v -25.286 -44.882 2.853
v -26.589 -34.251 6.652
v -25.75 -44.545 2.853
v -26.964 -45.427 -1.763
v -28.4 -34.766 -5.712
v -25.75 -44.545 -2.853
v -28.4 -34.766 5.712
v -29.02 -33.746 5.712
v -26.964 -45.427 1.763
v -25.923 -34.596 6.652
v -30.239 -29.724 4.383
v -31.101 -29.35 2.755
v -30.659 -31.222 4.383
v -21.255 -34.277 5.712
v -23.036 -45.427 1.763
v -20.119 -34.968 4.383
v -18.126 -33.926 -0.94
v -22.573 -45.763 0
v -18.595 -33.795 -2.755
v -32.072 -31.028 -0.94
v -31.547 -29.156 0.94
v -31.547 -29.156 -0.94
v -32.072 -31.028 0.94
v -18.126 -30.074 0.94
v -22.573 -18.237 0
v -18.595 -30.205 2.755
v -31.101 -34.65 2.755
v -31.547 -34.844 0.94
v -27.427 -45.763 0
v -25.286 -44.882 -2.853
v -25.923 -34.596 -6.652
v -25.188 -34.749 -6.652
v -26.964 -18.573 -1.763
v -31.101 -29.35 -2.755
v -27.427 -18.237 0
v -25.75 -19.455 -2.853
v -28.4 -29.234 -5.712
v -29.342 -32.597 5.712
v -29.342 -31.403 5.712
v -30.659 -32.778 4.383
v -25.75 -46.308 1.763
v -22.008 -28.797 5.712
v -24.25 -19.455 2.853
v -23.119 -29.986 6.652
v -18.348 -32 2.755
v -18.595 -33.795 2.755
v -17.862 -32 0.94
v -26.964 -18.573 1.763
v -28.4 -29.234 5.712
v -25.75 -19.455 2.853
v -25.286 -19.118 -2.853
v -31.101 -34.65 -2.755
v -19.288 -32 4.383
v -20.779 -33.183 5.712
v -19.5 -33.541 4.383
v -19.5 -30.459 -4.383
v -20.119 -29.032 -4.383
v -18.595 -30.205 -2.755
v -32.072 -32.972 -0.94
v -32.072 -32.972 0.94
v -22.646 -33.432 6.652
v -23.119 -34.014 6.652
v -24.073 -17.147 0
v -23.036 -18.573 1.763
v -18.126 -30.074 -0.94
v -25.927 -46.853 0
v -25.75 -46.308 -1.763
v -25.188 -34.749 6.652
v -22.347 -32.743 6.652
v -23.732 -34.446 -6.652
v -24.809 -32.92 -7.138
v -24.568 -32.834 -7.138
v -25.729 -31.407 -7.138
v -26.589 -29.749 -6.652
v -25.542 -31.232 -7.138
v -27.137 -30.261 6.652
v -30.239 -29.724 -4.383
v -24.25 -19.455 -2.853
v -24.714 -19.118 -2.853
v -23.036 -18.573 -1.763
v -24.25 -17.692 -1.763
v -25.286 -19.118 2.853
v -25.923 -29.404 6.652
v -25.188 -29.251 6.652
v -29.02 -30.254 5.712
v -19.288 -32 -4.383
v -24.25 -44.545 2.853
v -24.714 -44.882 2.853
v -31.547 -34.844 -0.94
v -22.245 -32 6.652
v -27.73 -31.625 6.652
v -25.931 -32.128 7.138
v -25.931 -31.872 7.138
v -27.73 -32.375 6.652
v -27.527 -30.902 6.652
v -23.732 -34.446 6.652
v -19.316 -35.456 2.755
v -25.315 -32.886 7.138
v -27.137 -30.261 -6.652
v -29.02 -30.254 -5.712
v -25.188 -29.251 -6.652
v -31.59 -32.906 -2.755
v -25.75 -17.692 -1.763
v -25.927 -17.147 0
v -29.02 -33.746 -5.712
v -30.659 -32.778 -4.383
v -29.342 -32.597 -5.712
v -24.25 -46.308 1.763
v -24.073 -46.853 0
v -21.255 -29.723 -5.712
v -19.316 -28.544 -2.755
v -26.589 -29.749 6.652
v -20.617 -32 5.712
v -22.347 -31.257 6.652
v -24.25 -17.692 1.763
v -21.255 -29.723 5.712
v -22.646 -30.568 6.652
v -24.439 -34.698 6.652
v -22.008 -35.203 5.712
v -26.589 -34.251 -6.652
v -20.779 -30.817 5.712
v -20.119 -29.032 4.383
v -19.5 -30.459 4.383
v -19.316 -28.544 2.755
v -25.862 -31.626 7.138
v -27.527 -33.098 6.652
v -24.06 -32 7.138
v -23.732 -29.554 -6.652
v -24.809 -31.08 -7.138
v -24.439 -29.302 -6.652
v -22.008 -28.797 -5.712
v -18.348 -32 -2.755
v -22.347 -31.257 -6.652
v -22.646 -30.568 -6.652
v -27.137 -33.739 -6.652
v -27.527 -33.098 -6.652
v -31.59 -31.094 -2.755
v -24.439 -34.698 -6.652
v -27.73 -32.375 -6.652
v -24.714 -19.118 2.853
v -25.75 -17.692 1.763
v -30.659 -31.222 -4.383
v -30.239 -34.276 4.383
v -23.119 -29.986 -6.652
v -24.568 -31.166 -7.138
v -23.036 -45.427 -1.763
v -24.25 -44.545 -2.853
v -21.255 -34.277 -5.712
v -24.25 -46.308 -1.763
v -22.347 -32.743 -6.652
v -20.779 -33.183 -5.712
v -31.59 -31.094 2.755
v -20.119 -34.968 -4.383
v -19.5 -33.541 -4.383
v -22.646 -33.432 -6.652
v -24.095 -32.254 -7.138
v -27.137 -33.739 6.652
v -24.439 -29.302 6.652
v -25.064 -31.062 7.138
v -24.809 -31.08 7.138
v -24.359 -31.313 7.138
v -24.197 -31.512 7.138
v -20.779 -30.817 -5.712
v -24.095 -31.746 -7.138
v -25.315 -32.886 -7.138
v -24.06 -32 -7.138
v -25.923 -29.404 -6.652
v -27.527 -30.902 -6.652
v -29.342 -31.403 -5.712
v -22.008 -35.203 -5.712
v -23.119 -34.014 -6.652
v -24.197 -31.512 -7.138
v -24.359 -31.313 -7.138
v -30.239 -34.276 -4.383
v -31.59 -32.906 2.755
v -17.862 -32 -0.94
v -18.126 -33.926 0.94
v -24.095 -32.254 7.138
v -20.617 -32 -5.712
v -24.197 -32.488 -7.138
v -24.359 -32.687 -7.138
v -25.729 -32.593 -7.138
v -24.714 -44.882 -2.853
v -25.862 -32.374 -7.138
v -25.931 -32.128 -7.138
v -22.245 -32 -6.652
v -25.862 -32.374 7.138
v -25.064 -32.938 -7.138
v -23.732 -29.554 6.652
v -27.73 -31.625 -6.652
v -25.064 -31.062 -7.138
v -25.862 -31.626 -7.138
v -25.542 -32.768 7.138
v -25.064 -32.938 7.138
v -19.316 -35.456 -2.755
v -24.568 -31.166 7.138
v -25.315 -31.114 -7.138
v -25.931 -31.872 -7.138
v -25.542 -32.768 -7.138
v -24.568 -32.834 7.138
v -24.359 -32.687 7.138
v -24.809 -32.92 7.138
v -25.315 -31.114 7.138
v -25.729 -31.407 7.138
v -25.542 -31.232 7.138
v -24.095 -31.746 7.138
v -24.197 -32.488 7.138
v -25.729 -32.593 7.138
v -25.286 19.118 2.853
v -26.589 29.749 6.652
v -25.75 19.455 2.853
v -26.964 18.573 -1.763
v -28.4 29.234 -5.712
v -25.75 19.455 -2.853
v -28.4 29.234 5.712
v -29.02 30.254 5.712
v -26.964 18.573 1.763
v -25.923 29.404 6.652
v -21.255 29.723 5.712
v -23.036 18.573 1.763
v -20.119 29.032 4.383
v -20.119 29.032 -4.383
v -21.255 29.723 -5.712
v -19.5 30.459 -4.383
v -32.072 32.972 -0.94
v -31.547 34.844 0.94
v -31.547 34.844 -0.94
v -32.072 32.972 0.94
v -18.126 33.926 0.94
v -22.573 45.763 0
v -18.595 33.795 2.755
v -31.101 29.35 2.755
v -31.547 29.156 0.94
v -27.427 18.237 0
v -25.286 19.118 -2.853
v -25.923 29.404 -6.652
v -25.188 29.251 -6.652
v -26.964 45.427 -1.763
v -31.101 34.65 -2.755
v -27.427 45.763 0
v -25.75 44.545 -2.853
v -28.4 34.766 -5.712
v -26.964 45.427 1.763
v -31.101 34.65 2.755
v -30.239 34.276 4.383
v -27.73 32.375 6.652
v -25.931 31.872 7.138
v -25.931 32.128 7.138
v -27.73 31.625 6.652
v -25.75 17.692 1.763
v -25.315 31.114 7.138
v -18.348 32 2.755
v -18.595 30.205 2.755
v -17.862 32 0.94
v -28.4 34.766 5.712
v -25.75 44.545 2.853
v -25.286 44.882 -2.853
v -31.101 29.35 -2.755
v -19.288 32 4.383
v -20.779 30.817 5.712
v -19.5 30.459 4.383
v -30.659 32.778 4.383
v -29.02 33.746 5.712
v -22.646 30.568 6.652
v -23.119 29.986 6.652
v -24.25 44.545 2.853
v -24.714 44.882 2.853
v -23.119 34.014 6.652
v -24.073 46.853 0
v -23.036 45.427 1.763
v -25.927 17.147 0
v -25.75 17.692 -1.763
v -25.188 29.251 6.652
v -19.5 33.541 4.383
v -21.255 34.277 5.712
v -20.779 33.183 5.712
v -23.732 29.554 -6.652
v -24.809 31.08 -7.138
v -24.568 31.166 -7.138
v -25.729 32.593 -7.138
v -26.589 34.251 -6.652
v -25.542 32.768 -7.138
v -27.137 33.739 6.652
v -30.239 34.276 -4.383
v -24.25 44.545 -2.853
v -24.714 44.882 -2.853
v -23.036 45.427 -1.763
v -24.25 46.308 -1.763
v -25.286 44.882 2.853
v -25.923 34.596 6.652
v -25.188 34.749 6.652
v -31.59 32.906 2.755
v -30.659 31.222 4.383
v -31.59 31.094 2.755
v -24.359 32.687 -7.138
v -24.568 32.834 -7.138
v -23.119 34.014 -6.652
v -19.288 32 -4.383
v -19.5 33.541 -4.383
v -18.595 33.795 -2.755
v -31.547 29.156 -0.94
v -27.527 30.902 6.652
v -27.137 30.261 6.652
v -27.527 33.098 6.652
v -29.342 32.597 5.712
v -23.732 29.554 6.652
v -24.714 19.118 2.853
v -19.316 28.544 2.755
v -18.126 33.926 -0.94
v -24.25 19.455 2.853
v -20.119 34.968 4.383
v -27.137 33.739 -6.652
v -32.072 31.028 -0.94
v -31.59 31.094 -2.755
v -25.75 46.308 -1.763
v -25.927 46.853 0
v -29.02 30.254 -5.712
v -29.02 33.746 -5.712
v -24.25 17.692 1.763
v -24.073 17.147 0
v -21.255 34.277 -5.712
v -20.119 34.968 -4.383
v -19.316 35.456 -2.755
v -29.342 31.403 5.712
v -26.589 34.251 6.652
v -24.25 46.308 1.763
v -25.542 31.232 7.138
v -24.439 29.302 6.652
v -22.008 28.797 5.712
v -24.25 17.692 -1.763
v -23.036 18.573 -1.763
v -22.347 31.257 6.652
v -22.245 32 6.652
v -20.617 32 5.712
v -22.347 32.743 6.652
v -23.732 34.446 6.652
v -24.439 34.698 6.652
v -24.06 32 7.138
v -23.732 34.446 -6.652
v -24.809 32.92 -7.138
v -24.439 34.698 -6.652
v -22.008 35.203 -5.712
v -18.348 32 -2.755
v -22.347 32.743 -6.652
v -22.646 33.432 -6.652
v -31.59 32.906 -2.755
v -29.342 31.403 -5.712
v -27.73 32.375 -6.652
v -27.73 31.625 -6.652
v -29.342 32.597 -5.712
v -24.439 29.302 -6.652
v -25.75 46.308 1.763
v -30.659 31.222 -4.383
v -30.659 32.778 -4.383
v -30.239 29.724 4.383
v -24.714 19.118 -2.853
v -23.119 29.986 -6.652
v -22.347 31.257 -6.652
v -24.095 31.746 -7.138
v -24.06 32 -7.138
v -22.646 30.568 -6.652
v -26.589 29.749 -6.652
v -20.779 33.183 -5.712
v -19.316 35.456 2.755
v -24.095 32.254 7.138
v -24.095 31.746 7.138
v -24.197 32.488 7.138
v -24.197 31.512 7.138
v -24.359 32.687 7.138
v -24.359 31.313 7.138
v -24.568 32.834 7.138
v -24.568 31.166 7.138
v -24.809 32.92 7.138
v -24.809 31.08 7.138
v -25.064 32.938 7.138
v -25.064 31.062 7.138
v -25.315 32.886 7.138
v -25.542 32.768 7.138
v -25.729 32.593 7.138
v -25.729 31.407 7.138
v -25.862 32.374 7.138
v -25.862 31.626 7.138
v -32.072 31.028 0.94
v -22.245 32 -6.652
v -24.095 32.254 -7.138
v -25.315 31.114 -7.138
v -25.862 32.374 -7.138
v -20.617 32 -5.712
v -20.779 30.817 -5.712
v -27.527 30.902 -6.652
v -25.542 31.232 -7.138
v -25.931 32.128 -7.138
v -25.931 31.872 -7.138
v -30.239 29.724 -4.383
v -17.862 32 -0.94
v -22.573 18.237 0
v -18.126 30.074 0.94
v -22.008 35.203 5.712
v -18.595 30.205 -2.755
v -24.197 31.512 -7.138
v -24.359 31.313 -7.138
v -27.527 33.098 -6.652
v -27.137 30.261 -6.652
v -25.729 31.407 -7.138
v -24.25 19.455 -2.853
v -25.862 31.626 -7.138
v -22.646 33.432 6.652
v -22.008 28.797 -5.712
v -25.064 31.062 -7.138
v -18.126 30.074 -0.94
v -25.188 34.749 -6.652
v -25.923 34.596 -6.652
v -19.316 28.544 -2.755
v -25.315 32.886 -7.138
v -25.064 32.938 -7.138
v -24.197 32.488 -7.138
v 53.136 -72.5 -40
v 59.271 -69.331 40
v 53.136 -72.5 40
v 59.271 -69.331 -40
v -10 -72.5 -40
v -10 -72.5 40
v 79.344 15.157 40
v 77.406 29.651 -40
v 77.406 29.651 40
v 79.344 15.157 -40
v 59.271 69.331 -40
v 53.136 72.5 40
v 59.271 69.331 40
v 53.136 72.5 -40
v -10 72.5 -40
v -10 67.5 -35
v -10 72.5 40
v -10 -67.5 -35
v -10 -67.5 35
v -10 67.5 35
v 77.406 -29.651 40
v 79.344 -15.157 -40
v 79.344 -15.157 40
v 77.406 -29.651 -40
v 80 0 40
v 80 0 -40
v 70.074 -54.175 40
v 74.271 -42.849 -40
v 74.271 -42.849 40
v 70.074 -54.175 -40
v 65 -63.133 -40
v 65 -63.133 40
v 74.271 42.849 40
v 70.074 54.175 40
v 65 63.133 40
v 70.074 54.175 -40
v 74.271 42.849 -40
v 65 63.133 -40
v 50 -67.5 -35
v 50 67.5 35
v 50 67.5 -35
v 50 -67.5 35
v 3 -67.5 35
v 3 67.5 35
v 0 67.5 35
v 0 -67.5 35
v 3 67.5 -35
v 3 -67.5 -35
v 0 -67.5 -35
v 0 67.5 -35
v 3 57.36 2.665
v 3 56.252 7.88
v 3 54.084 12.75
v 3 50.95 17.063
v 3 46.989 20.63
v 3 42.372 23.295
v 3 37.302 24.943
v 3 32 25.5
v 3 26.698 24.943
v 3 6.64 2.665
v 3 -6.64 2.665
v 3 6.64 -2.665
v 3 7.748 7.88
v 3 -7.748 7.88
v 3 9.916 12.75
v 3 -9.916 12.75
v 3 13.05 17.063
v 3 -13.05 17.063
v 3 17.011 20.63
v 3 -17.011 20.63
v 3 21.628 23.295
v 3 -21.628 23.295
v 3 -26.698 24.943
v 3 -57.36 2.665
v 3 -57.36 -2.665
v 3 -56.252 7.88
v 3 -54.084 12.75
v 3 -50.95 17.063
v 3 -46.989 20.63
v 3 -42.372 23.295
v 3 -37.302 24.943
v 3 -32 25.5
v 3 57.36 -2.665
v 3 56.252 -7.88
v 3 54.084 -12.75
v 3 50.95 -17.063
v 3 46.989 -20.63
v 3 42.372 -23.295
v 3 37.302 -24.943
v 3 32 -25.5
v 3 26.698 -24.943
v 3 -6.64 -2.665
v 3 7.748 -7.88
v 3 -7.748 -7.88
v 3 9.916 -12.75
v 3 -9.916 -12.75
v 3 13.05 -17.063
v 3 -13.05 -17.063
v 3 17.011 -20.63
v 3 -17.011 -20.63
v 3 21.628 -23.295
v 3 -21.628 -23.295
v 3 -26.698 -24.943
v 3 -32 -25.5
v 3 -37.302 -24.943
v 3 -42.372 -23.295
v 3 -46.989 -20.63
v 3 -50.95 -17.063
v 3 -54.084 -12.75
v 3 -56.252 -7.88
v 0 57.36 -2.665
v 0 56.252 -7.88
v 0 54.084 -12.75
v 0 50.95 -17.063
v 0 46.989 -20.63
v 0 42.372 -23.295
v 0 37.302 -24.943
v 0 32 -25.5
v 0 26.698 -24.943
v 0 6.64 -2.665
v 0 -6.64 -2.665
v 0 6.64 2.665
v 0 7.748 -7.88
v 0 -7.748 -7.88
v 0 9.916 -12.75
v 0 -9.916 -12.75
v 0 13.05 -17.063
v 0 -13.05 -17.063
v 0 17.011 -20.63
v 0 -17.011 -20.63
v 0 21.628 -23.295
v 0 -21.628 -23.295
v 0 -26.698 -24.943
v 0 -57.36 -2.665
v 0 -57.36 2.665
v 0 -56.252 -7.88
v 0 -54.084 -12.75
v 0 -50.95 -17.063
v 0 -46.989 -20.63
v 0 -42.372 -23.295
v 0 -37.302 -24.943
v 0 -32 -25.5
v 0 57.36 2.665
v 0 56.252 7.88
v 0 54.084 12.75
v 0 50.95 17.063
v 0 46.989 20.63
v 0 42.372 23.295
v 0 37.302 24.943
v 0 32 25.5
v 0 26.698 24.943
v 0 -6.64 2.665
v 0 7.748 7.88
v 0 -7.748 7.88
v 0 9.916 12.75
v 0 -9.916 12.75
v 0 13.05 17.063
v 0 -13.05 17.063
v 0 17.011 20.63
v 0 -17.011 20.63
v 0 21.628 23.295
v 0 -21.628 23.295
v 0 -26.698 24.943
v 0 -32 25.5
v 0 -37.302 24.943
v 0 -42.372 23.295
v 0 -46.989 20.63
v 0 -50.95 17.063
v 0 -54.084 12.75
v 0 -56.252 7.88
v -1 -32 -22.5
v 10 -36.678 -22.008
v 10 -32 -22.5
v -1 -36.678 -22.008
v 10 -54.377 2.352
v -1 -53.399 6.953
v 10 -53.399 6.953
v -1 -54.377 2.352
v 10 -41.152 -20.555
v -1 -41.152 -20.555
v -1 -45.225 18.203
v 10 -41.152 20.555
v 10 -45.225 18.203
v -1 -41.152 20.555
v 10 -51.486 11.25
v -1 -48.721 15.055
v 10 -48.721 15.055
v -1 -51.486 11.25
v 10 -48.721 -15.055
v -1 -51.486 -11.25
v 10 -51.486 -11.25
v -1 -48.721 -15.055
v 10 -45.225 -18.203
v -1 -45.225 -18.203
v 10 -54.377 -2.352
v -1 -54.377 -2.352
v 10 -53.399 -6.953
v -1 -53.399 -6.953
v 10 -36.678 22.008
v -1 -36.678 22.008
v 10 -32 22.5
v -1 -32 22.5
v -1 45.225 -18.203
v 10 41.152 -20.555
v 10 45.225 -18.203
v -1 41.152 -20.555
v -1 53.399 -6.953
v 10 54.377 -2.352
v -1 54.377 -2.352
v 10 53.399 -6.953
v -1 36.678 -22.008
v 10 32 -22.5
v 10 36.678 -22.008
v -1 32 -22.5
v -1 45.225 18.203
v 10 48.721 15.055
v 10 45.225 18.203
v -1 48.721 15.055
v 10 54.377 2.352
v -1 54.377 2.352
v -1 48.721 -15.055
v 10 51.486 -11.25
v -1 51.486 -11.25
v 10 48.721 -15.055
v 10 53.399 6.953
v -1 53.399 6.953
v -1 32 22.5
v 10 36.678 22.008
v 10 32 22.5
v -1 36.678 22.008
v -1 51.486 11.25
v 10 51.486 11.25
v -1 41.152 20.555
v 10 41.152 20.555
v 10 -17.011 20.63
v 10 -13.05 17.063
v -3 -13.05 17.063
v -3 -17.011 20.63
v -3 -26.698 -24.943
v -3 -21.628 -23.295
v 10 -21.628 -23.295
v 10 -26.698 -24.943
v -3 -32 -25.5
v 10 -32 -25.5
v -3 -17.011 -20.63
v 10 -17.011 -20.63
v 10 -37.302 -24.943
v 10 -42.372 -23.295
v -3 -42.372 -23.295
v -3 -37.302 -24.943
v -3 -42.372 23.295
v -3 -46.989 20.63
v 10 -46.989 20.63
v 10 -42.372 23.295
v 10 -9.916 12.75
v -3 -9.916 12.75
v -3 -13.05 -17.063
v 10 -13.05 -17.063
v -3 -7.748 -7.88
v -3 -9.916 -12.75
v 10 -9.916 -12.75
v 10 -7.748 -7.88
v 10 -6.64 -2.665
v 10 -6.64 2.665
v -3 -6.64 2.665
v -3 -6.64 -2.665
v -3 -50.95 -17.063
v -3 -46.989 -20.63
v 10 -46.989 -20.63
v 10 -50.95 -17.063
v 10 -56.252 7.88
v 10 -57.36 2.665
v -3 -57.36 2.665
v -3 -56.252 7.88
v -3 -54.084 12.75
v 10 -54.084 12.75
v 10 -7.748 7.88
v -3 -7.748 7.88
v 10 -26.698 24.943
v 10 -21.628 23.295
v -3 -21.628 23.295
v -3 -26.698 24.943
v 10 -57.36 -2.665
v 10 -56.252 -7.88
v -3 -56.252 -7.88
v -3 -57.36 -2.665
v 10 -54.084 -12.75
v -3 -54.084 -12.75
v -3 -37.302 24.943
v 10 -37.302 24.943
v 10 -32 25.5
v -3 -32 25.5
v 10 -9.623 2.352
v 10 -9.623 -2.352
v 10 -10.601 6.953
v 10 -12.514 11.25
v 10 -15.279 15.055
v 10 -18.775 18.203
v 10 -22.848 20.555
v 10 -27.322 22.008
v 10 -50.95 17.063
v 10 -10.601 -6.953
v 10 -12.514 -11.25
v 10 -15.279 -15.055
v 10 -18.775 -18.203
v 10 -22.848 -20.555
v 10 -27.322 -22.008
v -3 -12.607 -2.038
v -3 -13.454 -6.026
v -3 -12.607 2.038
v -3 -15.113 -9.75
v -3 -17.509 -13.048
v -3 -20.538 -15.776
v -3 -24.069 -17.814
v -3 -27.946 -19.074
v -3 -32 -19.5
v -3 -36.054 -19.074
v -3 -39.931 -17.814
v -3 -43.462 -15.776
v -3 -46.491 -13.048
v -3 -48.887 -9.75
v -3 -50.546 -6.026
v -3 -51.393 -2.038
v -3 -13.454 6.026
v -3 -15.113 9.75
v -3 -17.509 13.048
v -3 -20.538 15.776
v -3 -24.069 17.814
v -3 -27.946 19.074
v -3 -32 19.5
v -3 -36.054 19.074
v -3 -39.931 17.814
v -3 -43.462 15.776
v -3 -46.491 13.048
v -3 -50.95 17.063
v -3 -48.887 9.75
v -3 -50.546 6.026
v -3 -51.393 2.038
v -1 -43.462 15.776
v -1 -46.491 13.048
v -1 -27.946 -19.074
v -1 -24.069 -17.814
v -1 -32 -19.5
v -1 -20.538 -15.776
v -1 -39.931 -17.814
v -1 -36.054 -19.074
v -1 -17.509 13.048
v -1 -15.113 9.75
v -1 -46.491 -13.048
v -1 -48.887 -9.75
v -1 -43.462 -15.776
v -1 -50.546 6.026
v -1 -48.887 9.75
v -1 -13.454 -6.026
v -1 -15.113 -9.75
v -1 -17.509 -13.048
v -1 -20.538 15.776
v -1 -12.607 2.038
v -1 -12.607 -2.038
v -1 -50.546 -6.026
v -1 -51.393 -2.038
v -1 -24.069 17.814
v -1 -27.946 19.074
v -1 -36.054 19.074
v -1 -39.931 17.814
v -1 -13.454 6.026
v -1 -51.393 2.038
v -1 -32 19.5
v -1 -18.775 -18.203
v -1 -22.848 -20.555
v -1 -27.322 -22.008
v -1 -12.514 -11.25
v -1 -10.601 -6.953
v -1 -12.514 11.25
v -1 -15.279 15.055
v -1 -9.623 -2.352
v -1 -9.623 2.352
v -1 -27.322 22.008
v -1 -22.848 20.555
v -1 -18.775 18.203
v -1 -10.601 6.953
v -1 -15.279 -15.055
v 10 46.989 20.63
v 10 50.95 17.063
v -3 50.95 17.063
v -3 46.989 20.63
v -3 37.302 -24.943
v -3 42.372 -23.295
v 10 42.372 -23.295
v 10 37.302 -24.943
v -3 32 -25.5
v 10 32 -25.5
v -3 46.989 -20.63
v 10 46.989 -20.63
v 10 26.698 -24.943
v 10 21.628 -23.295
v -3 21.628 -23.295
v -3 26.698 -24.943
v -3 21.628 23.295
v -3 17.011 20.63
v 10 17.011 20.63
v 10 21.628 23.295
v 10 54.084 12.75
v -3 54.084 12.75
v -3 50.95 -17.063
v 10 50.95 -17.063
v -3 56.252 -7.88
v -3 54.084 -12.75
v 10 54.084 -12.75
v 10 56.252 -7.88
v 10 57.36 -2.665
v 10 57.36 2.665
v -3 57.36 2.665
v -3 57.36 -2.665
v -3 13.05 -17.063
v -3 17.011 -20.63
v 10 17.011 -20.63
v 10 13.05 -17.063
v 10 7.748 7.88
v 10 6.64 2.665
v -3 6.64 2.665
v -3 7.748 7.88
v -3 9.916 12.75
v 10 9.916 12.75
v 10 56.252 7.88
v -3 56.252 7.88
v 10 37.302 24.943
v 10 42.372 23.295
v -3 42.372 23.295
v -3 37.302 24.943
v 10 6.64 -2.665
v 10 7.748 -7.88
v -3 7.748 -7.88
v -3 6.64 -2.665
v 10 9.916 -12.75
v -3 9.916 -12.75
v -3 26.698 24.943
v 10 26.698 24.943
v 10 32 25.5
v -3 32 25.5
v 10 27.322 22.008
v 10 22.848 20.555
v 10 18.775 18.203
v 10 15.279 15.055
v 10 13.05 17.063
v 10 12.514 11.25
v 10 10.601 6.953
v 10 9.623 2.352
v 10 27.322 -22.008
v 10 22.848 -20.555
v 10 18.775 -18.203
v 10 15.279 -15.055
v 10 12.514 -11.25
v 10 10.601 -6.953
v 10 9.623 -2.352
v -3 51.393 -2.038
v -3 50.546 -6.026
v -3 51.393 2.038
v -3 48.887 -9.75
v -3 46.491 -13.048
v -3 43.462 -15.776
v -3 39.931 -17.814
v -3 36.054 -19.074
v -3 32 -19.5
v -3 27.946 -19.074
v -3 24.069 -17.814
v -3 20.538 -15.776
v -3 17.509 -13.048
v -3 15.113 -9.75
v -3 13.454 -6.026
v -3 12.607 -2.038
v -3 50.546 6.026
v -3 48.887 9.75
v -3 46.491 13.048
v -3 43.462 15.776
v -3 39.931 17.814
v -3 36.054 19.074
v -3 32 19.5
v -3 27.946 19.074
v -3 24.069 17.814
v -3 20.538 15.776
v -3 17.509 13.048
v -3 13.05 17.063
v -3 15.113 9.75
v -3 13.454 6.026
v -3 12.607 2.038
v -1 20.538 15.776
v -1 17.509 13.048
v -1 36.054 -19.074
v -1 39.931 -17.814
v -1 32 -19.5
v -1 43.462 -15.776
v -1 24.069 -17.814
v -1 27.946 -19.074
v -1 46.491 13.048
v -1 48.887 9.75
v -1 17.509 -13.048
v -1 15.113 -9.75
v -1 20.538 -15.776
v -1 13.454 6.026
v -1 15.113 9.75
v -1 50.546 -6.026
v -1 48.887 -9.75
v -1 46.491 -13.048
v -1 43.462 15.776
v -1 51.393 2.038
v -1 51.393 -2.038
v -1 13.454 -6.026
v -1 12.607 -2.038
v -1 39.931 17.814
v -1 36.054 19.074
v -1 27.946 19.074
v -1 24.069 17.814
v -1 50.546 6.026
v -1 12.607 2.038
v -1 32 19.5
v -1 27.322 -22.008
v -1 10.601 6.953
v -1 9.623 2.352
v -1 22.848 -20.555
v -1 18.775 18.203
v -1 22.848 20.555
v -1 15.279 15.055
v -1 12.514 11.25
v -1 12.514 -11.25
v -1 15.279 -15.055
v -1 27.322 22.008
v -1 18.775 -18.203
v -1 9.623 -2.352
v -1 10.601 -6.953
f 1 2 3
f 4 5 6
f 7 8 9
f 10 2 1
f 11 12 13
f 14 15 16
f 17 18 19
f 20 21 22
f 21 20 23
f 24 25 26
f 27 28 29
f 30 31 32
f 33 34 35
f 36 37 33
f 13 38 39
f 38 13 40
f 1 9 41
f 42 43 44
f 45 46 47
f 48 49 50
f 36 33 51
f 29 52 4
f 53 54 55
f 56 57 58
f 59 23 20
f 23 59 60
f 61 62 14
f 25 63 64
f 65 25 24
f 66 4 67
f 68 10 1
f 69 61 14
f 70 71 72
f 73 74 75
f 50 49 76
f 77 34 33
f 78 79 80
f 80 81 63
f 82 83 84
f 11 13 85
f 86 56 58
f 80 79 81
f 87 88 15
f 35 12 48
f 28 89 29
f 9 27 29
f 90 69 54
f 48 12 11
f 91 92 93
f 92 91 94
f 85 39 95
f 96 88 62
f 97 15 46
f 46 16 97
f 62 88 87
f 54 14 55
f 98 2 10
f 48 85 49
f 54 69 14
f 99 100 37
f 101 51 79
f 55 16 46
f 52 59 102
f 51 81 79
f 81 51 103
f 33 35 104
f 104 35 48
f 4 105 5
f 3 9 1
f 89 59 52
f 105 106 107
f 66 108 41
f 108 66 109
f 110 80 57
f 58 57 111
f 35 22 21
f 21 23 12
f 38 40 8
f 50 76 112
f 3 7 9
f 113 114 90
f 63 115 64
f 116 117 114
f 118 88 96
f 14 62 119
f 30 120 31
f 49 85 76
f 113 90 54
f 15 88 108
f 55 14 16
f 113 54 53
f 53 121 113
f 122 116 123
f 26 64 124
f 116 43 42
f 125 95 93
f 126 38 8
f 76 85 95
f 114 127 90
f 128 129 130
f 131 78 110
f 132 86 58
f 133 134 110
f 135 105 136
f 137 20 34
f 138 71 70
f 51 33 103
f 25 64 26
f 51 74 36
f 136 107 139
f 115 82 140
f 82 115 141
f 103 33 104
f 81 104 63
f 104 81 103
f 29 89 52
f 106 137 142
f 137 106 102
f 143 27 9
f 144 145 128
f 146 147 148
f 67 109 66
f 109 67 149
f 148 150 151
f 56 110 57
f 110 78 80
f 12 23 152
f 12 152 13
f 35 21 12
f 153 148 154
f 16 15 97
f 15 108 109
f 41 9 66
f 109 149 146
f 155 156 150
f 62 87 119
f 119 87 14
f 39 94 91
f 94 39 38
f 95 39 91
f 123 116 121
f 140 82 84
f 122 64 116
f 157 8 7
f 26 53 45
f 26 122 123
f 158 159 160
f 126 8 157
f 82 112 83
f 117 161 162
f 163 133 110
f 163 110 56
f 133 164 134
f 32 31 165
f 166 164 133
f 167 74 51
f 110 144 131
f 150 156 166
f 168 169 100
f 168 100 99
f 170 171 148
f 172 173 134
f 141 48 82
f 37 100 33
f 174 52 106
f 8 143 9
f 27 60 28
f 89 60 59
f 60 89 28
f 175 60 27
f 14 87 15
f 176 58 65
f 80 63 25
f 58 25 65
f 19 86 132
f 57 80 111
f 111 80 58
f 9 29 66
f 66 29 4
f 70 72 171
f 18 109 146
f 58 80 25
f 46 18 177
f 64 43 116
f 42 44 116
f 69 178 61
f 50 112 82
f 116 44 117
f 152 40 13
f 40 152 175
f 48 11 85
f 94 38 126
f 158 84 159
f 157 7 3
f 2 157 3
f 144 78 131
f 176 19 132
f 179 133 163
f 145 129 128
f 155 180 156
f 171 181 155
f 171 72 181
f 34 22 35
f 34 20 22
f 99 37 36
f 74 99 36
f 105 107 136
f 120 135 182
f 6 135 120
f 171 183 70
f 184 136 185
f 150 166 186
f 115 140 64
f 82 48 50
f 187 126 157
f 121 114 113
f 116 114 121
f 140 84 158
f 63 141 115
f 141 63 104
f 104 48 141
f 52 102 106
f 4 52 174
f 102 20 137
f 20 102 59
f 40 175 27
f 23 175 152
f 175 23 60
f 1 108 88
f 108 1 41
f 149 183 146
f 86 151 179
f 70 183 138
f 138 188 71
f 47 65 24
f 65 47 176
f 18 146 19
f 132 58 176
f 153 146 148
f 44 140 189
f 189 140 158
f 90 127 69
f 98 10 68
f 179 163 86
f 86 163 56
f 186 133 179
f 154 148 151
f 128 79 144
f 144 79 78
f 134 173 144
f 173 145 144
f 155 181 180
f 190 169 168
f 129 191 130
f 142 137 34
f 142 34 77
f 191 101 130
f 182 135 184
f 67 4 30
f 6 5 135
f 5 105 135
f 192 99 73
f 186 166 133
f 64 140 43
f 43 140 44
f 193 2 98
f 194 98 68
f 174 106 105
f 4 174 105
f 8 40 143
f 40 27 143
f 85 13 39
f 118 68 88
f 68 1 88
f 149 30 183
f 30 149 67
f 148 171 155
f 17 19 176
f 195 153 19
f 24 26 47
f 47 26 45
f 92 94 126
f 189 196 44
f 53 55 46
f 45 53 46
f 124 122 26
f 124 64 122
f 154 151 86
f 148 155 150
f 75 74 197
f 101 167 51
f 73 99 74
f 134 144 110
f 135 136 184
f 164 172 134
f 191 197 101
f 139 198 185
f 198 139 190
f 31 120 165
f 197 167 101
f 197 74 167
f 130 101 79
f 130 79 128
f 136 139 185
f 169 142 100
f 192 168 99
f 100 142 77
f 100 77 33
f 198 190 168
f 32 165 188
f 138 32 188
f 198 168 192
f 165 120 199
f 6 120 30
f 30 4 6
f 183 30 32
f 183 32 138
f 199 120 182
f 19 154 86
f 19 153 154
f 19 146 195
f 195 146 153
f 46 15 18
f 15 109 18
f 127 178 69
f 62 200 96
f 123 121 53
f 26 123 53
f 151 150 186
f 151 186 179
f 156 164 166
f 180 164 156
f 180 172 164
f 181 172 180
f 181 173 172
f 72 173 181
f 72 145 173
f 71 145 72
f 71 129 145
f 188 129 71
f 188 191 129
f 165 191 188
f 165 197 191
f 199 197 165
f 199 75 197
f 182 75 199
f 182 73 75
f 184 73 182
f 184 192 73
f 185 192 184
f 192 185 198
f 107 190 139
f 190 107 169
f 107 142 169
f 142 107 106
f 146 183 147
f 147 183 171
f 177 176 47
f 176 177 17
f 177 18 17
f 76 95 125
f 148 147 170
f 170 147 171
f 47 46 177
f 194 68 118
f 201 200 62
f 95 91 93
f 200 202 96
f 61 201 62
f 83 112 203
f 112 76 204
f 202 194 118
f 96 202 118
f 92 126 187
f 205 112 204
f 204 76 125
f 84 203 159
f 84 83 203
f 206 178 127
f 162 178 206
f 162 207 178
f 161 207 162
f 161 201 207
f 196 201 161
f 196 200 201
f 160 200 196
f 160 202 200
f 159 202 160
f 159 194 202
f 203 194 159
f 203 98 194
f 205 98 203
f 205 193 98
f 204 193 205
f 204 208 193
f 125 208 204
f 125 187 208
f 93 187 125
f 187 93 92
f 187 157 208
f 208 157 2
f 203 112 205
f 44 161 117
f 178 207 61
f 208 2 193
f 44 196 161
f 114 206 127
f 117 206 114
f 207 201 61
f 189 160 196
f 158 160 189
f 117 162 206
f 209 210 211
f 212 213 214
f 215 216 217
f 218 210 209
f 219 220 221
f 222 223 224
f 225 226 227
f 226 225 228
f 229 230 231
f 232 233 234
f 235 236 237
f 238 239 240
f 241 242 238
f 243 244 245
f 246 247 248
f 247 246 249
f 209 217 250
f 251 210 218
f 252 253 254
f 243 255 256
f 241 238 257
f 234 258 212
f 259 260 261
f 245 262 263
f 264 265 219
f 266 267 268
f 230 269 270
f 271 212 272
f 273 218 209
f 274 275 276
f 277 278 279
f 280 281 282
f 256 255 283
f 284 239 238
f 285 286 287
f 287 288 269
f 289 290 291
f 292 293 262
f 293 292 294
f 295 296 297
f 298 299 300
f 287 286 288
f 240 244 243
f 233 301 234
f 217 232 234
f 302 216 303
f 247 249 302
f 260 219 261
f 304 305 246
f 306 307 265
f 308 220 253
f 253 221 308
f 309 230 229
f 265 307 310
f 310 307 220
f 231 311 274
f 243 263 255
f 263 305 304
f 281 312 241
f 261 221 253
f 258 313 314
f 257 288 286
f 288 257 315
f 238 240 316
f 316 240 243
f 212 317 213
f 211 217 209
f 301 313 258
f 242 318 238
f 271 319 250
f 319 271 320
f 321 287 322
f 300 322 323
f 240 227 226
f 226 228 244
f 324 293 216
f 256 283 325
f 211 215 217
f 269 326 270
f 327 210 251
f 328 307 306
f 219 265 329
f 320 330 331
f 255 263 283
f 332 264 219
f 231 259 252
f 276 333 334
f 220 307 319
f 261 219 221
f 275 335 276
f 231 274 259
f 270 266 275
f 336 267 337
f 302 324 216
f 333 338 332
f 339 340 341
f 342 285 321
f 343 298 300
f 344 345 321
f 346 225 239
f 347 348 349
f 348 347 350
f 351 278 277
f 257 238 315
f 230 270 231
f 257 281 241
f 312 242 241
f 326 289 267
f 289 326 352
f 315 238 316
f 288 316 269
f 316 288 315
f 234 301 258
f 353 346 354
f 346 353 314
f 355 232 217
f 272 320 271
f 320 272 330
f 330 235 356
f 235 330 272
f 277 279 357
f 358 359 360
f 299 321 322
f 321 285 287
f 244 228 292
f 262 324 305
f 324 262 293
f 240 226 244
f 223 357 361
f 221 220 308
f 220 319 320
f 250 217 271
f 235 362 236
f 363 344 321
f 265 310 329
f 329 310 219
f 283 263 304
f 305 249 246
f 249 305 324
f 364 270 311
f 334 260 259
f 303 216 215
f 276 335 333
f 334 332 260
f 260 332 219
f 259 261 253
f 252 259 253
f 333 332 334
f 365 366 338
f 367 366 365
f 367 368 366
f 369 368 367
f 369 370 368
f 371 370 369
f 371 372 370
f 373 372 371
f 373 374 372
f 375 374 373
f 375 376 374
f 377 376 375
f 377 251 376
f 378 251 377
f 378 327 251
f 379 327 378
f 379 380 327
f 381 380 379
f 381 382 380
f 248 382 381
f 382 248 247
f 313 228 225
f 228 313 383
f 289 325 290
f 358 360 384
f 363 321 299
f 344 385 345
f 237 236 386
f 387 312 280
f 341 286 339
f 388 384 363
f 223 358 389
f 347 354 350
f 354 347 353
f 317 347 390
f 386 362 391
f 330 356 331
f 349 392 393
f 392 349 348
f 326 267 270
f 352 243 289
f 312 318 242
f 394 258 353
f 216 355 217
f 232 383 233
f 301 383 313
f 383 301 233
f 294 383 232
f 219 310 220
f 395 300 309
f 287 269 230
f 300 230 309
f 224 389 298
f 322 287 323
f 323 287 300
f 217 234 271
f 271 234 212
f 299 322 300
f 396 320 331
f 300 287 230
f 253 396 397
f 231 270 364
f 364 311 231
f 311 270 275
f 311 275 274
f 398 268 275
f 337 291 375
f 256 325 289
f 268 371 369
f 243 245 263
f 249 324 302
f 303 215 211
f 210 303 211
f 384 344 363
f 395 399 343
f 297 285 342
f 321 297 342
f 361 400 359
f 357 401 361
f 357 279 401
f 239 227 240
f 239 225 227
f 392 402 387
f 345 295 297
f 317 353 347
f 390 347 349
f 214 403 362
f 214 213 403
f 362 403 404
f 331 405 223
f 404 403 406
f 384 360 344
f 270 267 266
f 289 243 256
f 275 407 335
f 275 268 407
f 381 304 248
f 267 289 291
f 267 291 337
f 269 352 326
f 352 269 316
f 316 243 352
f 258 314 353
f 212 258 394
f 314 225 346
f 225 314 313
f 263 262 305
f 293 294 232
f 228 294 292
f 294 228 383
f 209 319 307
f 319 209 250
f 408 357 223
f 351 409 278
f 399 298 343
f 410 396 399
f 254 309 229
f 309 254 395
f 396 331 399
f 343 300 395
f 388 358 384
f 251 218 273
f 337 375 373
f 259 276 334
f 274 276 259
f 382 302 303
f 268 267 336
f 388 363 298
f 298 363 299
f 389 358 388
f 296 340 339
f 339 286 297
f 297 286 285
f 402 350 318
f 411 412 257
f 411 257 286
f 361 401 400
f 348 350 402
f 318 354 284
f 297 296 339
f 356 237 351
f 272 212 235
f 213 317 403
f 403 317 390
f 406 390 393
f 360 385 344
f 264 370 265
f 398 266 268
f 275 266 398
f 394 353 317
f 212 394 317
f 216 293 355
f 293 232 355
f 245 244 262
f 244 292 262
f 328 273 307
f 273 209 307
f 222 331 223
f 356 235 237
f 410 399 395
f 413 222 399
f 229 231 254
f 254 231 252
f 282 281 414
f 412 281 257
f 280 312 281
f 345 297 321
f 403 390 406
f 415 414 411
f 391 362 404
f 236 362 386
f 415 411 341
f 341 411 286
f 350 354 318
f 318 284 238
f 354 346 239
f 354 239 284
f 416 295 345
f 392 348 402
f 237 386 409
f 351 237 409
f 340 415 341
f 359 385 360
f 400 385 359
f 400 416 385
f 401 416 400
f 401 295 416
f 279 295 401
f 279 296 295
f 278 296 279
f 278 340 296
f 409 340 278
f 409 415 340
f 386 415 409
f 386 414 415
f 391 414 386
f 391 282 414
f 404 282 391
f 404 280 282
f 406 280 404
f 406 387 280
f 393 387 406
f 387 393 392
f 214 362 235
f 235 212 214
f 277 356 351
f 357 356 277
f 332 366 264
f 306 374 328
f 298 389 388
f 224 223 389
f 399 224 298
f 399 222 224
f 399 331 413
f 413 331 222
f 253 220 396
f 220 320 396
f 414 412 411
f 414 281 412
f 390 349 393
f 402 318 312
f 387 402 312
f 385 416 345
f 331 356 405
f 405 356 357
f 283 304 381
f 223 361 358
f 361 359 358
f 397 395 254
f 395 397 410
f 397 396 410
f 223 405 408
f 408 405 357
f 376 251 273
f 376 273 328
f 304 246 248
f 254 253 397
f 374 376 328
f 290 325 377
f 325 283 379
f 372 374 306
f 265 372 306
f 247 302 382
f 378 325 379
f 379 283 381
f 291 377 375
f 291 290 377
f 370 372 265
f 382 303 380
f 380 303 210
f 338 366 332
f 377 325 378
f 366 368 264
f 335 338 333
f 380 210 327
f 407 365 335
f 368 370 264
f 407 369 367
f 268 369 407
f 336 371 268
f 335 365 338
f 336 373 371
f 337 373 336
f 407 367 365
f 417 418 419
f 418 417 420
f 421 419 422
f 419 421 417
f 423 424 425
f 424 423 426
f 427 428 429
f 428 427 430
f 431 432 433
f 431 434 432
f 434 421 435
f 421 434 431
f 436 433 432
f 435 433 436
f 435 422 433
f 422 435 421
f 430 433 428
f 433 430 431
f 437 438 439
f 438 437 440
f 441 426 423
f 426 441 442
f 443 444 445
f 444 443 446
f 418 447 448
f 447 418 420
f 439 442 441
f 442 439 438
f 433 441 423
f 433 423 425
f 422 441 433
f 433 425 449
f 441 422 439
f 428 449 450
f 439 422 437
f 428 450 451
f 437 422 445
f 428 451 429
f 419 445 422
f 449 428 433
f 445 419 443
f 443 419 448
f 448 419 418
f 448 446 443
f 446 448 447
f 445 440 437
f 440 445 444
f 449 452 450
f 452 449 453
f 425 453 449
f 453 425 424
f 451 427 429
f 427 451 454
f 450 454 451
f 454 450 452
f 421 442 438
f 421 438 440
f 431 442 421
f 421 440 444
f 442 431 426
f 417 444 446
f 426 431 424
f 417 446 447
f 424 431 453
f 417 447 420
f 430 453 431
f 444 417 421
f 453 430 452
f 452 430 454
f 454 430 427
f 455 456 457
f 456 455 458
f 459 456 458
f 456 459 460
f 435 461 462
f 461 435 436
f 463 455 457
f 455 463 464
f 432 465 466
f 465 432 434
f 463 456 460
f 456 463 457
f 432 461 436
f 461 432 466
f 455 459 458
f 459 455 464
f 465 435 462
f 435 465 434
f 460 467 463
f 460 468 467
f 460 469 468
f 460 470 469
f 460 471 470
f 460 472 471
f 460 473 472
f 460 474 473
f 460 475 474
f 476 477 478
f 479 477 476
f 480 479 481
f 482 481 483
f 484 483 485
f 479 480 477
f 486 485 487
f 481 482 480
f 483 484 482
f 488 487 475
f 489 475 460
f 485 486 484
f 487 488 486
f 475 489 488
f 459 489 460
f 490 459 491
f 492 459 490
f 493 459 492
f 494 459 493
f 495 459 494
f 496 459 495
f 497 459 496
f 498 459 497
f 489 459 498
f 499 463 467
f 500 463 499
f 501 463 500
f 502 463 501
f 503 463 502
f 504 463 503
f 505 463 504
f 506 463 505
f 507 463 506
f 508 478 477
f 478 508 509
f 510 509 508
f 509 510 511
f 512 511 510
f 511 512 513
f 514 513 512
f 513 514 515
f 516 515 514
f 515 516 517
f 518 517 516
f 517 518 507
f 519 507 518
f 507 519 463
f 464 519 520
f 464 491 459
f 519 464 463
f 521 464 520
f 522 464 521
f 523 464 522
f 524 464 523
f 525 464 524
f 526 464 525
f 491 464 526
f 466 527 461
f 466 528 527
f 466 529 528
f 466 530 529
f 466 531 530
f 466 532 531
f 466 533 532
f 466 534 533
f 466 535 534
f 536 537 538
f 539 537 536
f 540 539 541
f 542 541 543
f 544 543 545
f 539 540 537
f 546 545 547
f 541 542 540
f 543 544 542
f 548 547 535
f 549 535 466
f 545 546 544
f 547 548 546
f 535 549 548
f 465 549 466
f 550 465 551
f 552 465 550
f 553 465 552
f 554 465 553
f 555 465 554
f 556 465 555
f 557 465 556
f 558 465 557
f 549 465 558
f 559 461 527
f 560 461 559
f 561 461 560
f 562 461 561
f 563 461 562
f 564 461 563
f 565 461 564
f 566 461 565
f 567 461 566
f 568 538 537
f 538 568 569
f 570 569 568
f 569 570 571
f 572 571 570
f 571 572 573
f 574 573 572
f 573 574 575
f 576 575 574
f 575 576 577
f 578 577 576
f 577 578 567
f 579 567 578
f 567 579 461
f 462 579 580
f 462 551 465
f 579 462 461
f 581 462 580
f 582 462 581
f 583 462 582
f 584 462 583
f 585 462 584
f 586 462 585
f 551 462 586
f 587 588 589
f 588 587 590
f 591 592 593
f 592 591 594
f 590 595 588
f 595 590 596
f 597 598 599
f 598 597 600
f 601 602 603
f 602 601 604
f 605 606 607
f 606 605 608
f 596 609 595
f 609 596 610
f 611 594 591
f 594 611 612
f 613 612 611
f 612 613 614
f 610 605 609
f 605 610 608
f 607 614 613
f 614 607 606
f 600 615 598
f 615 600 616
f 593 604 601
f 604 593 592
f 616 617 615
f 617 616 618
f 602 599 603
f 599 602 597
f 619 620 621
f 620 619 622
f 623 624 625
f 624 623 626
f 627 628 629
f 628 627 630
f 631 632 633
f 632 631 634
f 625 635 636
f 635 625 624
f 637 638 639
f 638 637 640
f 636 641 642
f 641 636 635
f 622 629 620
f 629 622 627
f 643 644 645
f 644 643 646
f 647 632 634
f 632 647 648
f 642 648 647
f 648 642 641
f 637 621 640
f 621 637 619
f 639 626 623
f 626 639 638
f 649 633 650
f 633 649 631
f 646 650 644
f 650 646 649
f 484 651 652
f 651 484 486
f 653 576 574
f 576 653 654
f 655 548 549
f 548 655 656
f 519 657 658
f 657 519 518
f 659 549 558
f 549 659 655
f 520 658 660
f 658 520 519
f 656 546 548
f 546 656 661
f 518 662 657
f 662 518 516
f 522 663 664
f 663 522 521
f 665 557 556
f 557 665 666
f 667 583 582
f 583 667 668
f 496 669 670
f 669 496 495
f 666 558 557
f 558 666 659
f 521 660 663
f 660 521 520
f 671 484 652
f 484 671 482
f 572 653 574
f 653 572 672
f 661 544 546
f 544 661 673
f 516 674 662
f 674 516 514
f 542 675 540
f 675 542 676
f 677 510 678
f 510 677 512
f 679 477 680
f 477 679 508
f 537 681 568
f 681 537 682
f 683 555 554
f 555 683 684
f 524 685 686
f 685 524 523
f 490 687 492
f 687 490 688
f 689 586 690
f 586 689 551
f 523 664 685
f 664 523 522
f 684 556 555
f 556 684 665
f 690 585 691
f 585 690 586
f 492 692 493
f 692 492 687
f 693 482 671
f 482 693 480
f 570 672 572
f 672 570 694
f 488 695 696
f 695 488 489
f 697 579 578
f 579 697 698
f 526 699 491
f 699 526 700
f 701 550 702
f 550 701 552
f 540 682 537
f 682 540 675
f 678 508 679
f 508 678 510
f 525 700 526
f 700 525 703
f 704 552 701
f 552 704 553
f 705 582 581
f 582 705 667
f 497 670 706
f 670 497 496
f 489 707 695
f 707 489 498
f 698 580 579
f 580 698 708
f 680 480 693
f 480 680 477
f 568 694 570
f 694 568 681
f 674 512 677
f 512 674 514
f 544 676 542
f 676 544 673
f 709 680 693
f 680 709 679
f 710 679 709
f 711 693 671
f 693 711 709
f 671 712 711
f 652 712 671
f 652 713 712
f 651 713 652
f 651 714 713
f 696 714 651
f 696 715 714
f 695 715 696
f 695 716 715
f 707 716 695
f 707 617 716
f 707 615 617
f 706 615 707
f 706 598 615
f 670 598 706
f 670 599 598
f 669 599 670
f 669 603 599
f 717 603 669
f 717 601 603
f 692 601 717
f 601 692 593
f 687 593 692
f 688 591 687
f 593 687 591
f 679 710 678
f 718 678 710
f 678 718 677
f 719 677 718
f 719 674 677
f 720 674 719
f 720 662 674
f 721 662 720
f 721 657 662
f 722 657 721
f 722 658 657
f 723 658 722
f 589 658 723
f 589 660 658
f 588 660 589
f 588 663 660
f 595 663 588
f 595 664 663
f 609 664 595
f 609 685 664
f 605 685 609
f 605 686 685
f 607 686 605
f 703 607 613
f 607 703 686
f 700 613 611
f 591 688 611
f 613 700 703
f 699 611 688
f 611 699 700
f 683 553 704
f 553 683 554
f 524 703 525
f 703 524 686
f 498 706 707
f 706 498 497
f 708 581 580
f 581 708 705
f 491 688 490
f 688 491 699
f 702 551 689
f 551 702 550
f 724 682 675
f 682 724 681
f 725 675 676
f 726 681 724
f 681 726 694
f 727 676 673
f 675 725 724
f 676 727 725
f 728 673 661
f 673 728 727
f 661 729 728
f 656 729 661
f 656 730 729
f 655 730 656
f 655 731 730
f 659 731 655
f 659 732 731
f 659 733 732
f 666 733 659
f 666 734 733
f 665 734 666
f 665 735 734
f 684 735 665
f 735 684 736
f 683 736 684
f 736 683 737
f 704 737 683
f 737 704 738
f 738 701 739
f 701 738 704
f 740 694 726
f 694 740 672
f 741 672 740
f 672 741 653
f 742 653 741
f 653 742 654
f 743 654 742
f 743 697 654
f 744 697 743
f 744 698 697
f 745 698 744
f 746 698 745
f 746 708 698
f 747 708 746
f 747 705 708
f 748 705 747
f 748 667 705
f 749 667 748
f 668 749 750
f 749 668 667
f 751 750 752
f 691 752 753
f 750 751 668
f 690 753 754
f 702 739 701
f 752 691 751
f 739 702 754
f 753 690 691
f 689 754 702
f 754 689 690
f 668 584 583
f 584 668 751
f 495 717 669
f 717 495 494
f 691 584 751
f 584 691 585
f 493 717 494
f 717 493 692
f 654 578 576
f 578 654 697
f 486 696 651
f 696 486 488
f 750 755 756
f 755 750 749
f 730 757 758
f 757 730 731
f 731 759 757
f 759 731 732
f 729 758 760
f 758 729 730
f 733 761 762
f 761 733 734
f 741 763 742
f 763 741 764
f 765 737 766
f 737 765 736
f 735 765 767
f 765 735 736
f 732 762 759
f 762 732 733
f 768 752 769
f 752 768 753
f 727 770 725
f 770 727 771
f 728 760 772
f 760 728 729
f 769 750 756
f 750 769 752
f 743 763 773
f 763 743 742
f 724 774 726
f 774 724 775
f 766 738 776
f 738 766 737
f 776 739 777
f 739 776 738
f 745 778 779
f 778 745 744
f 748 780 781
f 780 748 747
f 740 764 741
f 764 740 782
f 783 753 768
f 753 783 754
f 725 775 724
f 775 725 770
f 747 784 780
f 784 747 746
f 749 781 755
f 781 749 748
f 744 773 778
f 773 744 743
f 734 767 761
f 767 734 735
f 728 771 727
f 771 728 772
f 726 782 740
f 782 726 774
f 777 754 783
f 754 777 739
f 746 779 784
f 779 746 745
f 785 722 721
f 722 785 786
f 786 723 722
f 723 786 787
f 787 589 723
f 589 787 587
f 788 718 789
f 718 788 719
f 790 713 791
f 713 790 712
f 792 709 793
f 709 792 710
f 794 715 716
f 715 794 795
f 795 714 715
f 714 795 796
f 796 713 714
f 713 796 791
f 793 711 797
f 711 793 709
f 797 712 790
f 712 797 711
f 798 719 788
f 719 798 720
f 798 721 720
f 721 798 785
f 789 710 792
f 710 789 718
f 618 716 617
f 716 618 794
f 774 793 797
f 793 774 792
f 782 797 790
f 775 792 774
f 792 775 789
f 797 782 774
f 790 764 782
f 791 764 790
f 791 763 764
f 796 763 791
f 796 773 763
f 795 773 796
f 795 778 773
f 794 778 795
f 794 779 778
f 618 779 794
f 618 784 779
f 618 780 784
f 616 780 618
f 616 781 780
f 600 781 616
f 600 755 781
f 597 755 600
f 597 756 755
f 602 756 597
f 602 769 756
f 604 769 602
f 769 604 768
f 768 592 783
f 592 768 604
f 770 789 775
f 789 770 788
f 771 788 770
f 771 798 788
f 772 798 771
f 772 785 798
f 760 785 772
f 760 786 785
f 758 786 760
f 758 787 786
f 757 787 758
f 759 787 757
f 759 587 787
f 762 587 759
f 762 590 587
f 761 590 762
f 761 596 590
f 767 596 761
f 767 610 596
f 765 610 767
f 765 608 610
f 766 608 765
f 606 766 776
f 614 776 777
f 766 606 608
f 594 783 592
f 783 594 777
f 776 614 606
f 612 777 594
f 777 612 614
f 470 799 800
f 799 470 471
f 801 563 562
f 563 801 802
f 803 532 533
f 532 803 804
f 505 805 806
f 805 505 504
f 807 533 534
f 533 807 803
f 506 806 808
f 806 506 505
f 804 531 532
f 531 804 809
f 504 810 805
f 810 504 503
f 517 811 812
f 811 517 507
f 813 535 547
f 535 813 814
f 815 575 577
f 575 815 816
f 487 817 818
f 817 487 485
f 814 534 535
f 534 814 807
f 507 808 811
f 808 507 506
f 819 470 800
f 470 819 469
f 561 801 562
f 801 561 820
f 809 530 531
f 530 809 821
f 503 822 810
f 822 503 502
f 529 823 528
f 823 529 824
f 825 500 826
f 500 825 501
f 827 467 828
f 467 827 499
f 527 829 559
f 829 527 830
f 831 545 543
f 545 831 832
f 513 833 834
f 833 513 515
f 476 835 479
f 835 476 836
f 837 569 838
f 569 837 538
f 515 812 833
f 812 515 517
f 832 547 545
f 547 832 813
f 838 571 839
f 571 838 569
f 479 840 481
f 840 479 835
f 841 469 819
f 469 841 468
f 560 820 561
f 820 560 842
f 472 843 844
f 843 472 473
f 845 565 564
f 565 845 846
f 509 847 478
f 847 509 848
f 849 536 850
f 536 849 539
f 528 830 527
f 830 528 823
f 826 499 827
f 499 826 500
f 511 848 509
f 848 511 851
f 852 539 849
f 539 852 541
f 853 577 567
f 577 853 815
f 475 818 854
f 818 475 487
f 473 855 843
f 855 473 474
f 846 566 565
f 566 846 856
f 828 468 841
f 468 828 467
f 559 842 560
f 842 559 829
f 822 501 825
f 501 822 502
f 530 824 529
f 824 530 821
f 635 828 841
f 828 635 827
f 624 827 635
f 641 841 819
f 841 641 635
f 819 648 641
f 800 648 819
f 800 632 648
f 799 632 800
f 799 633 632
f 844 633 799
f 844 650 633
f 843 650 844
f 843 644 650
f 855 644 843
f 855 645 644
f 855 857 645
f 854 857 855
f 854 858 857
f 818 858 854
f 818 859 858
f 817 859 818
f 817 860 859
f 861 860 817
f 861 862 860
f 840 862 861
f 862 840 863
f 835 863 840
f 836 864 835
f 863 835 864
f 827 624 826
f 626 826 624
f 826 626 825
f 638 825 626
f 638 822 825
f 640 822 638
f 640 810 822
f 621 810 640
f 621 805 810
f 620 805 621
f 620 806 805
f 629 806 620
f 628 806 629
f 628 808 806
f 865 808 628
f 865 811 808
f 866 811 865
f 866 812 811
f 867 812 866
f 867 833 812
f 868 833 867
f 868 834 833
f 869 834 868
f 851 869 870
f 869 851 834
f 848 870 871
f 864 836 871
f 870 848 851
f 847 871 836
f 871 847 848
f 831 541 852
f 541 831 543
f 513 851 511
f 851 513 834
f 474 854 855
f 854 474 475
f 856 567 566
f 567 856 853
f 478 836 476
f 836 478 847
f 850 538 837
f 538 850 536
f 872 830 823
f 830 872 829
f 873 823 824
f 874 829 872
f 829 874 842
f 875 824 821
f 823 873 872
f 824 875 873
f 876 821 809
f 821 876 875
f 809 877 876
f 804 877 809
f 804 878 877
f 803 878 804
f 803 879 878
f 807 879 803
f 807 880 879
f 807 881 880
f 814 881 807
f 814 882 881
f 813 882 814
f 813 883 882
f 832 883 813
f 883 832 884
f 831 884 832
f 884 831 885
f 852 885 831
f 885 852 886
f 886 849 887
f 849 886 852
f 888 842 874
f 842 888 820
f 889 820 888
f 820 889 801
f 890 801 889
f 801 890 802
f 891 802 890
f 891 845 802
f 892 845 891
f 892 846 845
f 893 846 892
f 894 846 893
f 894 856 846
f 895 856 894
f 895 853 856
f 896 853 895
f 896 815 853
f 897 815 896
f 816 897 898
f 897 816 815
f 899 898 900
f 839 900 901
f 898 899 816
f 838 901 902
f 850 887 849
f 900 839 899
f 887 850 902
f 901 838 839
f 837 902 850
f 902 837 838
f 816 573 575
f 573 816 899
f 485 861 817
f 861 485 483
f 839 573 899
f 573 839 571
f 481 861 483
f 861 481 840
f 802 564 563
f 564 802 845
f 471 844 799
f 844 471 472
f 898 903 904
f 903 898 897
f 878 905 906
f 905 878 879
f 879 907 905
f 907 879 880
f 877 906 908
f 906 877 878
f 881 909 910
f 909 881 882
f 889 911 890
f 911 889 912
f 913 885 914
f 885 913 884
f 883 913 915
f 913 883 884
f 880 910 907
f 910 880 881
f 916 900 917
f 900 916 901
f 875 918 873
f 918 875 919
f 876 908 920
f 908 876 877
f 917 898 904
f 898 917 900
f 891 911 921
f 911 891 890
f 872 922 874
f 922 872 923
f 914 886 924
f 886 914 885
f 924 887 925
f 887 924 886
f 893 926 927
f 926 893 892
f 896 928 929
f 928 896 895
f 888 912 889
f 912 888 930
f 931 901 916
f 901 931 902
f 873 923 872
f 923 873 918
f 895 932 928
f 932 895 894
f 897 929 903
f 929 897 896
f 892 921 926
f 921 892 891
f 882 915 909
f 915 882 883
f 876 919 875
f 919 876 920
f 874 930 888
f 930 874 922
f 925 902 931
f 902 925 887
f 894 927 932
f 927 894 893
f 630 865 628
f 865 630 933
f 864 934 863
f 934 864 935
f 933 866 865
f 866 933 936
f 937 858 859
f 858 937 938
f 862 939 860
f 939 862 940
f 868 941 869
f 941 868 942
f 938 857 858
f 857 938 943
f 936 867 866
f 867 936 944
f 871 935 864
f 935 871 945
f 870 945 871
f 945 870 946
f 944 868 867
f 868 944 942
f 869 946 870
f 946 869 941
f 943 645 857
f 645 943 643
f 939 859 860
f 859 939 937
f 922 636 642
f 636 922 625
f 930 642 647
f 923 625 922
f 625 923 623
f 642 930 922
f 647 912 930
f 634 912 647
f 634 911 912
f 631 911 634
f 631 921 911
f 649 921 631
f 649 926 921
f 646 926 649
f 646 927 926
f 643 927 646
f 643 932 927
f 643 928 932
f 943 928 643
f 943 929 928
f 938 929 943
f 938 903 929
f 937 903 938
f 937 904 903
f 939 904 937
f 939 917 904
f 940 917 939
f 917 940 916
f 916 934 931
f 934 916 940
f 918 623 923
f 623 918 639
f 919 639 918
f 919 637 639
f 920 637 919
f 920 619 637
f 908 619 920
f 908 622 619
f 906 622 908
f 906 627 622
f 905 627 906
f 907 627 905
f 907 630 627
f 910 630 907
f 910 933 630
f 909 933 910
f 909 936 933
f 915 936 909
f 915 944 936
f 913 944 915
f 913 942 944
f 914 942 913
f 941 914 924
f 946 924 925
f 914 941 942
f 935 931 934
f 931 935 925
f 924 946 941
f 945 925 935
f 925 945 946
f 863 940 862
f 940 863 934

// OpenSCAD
// file: FacePlate.scad
/** @file FacePlate.scad
 * @copyright Copyright (c) 2021 Marceline Cramer
 * SPDX-License-Identifier: MIT
 */

module FacePlateBase(width, height) {
  thickness = 3;
  translate([0, -width/2, -height/2])
	  cube([thickness, width, height]);
}

module LensMountShaft(lens_diameter, depth) {
  margin = 2;
  translate([0,0,-margin/2])
    cylinder(h=depth+margin, d=lens_diameter);
}

module LensMountEyeHole(lens_diameter, depth, thickness) {
  translate([0,0,1-depth])
    cylinder(h=depth, d=lens_diameter - thickness * 2);
}

module LensMountOuter(lens_diameter, depth, thickness) {
  translate([0,0,-thickness])
    cylinder(h=depth+thickness, d=lens_diameter + thickness * 2);
}

module LensMount(lens_diameter, thickness, depth=10) {
  rotate([0,90,0]) {
    difference() {
      LensMountOuter(lens_diameter, depth, thickness);
      LensMountEyeHole(lens_diameter, depth, thickness);
      LensMountShaft(lens_diameter, depth);
    }
  }
}

module FacePlate(width, height, lens_diameter, ipd, mount_thickness=3) {
  mount_depth = 10;
  difference() {
    FacePlateBase(width, height);
		translate([0,-ipd/2,0]) rotate([0,90,0]) cylinder(h=mount_depth, d=lens_diameter, center=true);
    translate([0, ipd/2,0]) rotate([0,90,0]) cylinder(h=mount_depth, d=lens_diameter, center=true);
  }

  translate([0,-ipd/2,0]) LensMount(lens_diameter, mount_thickness, mount_depth);
  translate([0, ipd/2,0]) LensMount(lens_diameter, mount_thickness, mount_depth);
}
// file: FaceDummy.scad
/** @file FaceDummy.scad
 * @copyright Copyright (c) 2021 Marceline Cramer
 * SPDX-License-Identifier: MIT
 */

module Eye(eye_width=24) {
	smooth_amount = 3.0;

	hull() {
	  translate([0, -eye_width/2, 0])
		  sphere(smooth_amount);

		translate([0, eye_width/2, 0])
		  sphere(smooth_amount);

		sphere(d=eye_width * 0.6);
	}
}

module FaceDummy(ipd=64) {
  translate([0,-ipd/2, 0])
	  Eye();
	translate([0, ipd/2, 0])
	  Eye();
}
// file: Chassis.scad
/** @file Chassis.scad
 * @copyright Copyright (c) 2021 Marceline Cramer
 * SPDX-License-Identifier: MIT
 */

module ChassisCase(
    width,
		height,
		depth,
		bulge_depth) {
  linear_extrude(height, center=true) {
	  union() {
	    resize([bulge_depth*2, width])
		    circle(d=20);

		  translate([-depth/2,0,0])
		    square([depth, width], center=true);
	  }
	}
}

module ChassisInterior(width, height, depth) {
  margin = 5;
	back_depth = depth + margin;

	translate([-back_depth, -width/2, -height/2])
    cube([back_depth, width, height]);
}

module Chassis(
    plate_width,
    plate_height,
		side_depth=60,
	  shell_thickness=5,
	  bulge_depth=30) {
	case_width = plate_width + shell_thickness * 2;
	case_height = plate_height  + shell_thickness * 2;

  difference() {
  	ChassisCase(case_width, case_height, side_depth, bulge_depth);
		ChassisInterior(plate_width, plate_height, side_depth);
	}
}
// main file
/** @file ParametricVR.scad
 * @copyright Copyright (c) 2021 Marceline Cramer
 * SPDX-License-Identifier: MIT
 */

include <Chassis.scad>;
include <FaceDummy.scad>;
include <FacePlate.scad>;

plate_width = 135;
plate_height = 70;
ipd = 64;
eye_offset = 25;

color([0.4, 0.4, 1.0])
translate([-eye_offset,0,0])
FaceDummy(ipd);

color([0.4, 1, 0.4])
translate([50,0,0])
Chassis(plate_width=plate_width, plate_height=plate_height);

color([1.0, 0.4, 0.4])
FacePlate(width=plate_width, height=plate_height, lens_diameter=45, ipd=ipd);
